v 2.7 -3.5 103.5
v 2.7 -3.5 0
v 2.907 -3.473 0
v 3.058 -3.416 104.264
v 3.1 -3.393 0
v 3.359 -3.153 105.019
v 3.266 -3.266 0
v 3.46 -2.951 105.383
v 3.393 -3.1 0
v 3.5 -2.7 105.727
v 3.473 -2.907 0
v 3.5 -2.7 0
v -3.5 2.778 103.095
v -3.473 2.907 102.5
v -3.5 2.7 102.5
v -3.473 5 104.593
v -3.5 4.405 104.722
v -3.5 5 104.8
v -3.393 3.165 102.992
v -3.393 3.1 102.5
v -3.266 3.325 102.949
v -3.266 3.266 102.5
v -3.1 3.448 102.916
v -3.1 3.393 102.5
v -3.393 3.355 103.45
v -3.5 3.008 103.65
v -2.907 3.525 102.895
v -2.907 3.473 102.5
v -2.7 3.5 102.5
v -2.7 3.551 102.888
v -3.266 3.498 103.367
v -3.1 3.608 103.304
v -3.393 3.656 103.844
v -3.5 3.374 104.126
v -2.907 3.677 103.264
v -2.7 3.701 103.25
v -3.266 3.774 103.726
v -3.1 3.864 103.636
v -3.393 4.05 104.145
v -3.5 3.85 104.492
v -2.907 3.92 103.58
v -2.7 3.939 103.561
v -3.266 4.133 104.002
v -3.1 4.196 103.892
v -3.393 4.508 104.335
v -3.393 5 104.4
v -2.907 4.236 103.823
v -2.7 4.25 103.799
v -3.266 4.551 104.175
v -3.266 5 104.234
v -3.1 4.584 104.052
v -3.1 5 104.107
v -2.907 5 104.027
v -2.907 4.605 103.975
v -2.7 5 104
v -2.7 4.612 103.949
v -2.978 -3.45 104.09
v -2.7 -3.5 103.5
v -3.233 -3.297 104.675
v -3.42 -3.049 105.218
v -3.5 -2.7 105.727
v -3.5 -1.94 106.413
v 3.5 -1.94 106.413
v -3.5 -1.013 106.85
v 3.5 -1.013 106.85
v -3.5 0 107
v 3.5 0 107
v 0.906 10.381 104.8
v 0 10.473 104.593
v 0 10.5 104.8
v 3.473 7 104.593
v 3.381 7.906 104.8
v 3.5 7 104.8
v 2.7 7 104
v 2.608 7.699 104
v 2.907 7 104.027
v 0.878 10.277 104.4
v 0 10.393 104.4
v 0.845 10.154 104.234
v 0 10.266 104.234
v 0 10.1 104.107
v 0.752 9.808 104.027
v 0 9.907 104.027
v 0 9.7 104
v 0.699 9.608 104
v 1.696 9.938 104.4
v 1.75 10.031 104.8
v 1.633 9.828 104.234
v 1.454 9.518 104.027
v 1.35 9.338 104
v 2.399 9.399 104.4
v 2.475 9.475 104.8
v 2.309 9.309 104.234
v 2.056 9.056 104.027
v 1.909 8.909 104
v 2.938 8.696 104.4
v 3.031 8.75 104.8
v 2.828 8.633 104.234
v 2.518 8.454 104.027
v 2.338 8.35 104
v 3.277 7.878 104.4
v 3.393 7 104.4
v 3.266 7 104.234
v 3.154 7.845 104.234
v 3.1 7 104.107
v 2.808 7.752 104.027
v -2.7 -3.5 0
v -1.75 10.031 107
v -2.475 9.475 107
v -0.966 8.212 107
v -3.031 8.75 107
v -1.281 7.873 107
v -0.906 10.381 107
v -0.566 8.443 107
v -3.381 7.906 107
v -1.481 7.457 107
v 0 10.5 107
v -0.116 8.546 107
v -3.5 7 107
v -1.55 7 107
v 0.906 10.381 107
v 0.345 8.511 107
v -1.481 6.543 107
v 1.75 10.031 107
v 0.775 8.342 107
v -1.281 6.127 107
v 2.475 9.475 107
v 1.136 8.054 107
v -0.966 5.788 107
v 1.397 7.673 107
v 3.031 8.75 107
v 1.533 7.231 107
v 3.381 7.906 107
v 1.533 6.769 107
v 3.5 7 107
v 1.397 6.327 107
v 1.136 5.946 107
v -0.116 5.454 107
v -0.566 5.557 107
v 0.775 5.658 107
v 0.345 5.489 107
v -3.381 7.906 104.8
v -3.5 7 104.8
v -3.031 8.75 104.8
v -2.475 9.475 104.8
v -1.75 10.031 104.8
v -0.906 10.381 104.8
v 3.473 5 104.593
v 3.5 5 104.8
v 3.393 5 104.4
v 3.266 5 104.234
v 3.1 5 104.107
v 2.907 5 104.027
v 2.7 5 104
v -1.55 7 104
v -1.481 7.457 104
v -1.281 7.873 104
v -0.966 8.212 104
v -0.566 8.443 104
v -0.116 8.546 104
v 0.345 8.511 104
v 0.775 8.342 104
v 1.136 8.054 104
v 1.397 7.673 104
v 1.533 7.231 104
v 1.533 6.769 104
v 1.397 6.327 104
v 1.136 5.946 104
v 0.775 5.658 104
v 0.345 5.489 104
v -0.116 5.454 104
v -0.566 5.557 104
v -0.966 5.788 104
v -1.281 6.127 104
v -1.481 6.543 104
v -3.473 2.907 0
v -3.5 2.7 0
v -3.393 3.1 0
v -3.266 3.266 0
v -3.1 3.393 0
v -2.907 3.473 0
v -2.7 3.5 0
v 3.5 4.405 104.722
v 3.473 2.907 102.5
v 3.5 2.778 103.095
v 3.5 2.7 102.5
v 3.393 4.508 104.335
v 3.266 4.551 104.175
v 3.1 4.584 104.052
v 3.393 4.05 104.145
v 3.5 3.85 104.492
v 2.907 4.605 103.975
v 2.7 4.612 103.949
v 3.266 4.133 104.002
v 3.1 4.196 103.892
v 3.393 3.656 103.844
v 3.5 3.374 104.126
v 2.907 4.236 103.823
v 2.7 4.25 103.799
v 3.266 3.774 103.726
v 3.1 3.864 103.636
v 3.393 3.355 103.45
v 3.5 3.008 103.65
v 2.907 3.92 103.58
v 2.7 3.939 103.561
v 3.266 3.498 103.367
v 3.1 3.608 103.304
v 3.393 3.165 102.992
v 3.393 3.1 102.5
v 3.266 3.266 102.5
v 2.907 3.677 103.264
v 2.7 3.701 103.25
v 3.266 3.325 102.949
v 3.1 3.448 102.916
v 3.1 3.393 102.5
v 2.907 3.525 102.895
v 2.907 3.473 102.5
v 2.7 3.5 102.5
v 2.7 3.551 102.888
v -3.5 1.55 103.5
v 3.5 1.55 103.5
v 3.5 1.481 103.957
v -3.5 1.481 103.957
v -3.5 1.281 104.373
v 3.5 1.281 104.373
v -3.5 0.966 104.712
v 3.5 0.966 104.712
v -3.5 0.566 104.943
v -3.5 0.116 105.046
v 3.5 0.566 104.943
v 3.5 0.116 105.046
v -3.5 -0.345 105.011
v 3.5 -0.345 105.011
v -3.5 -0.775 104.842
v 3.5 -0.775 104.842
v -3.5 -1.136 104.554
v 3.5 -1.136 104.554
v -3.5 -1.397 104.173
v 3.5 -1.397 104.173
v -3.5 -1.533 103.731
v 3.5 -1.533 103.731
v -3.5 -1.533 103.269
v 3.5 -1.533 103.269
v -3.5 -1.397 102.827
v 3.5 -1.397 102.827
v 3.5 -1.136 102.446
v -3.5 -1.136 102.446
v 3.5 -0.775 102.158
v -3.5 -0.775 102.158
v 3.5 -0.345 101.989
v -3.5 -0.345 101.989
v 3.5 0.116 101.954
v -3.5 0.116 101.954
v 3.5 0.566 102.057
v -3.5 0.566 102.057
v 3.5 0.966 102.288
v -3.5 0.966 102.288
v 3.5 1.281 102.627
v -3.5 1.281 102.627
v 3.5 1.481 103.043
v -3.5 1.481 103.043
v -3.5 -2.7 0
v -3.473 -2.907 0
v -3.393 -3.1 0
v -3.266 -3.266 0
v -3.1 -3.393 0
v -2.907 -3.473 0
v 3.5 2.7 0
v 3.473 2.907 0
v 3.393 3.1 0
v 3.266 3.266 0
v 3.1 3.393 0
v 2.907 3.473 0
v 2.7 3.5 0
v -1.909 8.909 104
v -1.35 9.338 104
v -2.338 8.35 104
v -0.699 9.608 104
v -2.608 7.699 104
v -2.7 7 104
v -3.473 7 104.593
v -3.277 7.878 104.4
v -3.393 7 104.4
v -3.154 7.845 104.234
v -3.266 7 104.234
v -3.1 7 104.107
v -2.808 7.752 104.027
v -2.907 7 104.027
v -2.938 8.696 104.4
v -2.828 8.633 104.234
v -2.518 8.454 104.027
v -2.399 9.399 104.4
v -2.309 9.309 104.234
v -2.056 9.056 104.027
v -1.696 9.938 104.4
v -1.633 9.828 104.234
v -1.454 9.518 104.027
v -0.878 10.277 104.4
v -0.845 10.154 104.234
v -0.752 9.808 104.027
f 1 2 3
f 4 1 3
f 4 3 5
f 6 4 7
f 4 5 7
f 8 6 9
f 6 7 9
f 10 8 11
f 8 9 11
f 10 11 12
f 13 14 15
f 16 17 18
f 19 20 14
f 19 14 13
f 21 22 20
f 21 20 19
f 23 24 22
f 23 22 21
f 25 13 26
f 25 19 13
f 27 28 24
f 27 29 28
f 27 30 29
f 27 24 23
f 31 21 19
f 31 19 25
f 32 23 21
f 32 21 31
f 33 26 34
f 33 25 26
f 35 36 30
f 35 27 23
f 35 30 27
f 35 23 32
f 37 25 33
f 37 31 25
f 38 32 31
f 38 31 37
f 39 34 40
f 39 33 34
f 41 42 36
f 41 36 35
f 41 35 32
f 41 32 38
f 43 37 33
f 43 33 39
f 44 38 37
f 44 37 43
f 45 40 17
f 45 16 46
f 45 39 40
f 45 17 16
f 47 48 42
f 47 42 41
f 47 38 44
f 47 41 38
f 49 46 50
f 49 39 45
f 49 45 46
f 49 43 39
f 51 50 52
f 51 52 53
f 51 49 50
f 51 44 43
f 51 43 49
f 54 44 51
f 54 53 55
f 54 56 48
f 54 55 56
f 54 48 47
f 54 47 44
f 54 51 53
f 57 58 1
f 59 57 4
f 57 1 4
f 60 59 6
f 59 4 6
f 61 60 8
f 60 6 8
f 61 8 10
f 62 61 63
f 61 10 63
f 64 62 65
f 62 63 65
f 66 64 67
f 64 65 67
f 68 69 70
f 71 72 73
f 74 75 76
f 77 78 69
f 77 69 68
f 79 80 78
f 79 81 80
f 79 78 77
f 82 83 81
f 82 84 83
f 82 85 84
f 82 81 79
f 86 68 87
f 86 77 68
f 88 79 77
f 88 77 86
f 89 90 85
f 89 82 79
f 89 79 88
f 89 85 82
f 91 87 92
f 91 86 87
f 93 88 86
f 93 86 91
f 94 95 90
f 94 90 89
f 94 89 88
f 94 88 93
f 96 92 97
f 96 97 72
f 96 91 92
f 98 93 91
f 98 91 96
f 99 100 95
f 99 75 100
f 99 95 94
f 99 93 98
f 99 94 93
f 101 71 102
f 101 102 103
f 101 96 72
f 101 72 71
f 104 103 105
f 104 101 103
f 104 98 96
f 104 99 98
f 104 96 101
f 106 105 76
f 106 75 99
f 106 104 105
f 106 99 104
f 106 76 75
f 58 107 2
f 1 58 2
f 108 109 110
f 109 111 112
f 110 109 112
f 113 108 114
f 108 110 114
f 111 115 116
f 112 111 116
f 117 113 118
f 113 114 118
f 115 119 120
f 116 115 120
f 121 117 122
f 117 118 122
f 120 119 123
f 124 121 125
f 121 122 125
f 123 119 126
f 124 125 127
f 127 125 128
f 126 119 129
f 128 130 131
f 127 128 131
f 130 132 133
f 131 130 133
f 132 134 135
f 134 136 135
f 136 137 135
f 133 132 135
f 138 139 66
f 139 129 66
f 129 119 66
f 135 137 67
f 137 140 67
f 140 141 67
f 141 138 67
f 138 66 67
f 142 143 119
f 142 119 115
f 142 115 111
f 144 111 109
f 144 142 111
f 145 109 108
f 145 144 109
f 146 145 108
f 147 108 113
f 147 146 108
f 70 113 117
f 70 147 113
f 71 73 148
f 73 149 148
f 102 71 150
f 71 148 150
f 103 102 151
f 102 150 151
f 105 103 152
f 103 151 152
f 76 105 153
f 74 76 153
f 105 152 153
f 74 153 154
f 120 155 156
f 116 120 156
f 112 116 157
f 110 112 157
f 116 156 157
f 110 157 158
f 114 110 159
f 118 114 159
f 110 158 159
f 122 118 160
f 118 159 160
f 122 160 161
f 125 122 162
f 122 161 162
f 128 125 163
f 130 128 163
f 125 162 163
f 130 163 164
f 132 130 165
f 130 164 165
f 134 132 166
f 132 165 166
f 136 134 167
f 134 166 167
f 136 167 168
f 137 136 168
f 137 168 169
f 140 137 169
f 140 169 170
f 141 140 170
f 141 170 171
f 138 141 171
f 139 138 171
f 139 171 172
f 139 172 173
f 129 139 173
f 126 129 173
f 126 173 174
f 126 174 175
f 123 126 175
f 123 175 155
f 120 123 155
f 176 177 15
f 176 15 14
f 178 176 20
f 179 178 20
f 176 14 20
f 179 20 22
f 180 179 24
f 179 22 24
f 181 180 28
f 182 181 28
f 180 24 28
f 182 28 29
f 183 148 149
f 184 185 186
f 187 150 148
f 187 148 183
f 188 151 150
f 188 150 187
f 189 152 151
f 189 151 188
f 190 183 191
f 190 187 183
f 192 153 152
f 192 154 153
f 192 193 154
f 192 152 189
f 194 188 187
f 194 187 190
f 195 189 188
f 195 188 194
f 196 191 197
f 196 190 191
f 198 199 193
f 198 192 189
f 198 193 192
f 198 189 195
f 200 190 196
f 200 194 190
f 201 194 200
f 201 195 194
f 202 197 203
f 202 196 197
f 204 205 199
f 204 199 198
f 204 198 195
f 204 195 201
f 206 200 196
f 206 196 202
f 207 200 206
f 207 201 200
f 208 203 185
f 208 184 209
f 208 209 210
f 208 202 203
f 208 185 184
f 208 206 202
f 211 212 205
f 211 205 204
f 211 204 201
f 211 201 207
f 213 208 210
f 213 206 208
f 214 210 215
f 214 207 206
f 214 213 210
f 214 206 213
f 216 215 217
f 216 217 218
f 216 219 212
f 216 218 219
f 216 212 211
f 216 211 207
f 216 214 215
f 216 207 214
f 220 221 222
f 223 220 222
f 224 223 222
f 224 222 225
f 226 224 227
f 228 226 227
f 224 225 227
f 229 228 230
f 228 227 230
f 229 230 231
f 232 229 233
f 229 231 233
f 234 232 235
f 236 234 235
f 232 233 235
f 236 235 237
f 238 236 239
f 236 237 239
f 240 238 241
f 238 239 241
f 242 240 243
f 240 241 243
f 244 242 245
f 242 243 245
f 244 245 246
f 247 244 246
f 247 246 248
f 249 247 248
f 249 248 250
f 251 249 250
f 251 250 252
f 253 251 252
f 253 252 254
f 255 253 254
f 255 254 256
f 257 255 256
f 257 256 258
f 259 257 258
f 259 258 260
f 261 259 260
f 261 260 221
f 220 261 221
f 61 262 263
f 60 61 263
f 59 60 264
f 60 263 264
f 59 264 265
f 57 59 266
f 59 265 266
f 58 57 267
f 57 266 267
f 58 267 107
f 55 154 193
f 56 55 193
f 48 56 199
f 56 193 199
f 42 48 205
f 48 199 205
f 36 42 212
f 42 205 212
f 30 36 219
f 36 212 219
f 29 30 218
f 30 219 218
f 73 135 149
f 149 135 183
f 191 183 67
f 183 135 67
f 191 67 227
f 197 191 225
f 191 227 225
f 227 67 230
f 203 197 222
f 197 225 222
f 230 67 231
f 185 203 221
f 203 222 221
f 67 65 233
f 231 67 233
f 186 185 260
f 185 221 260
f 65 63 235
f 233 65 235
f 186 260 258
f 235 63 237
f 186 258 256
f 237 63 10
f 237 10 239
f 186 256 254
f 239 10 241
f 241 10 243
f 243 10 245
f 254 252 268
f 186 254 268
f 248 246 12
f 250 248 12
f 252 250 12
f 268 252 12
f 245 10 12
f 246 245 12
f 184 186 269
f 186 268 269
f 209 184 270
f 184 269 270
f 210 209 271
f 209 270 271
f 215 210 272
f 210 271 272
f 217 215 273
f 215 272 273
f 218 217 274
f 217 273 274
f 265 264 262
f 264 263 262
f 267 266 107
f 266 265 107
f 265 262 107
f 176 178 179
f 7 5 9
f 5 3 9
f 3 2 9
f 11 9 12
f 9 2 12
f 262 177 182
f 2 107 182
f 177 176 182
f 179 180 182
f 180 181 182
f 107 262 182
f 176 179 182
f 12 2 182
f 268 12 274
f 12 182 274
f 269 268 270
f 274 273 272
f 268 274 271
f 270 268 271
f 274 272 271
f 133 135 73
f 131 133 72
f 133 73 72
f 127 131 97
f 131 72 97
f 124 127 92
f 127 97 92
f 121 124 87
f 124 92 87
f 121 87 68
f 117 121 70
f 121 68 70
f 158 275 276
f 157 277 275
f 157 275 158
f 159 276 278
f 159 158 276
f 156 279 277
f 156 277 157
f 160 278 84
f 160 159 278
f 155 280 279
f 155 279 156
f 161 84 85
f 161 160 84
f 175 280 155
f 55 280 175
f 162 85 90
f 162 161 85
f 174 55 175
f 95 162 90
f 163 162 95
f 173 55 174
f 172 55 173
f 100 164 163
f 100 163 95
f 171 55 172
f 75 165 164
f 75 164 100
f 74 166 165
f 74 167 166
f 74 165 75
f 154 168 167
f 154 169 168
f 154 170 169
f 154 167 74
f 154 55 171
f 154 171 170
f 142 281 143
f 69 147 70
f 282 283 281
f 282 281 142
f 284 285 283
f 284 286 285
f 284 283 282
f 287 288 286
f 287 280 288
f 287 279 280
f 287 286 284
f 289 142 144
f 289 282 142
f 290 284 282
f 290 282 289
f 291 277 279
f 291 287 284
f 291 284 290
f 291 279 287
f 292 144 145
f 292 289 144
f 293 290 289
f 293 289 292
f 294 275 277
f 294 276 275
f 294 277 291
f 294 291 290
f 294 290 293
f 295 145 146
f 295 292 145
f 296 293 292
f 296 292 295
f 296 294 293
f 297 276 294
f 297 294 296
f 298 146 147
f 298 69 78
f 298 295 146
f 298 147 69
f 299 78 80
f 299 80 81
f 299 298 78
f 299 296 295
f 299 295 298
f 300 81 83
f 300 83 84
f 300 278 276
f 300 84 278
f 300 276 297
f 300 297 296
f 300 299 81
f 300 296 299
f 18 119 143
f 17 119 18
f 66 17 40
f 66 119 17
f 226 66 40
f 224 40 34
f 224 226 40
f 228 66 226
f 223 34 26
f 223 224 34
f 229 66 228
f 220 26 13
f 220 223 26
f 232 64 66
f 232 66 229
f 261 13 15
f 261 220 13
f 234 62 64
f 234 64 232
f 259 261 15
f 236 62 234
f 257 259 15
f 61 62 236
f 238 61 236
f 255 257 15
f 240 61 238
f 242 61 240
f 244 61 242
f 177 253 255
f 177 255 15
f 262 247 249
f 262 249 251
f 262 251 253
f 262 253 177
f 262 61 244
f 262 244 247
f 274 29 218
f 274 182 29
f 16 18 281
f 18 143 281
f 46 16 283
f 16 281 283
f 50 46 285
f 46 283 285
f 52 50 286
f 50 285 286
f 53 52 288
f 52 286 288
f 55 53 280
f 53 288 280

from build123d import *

# Parameters (mm, degrees)
SKETCH_1_W          = 7
SKETCH_1_H          = 7
EXTRUDE_1_DEPTH     = 107
FILLET_1_R          = 3.5
SKETCH_5_R          = 1.55
CUT_EXTRUDE_2_DEPTH = 108.285833175
SKETCH_6_W          = 7
SKETCH_6_H          = 3
EXTRUDE_2_DEPTH     = 7
FILLET_2_R          = 3.5
SKETCH_7_R          = 1.55
CUT_EXTRUDE_4_DEPTH = 105.587284122
FILLET_3_R          = 1.5
FILLET_4_R          = 0.8
FILLET_5_R          = 0.8


# Some blends are built 0.0001 mm under size
with BuildPart() as part:
    # 草图1 → 凸台-拉伸1 (new body)
    with BuildSketch(Plane.XY):
        Rectangle(SKETCH_1_W, SKETCH_1_H)
    extrude(amount=EXTRUDE_1_DEPTH)

    # 圆角1
    fillet_1_edges = [part.edges().sort_by_distance(p)[0] for p in [
        (0, -3.5, 107),
    ]]
    fillet(fillet_1_edges, radius=FILLET_1_R)

    # 草图5 → 切除-拉伸2 (cut, through all)
    with BuildSketch(Plane(origin=(3.5, 0, 0), x_dir=(0, 0, -1), z_dir=(1, 0, 0))):
        with Locations(Location((-103.5, 0, 0), (0, 0, 90))):
            Circle(SKETCH_5_R)
    extrude(amount=-CUT_EXTRUDE_2_DEPTH, mode=Mode.SUBTRACT)

    # 草图6 → 凸台-拉伸2 (add)
    with BuildSketch(Plane(origin=(0, 3.5, 0), x_dir=(1, 0, 0), z_dir=(0, 1, 0))):
        with Locations((0, -105.5)):
            Rectangle(SKETCH_6_W, SKETCH_6_H)
    extrude(amount=EXTRUDE_2_DEPTH)

    # 圆角2
    fillet_2_edges = [part.edges().sort_by_distance(p)[0] for p in [
        (3.5, 10.5, 105.5),
        (-3.5, 10.5, 105.5),
    ]]
    fillet(fillet_2_edges, radius=FILLET_2_R - 0.0001)  # a hair under: the kernel refuses the full size

    # 草图7 → 切除-拉伸4 (cut, through all)
    with BuildSketch(Plane(origin=(0, 0, 104), x_dir=(-1, 0, 0), z_dir=(0, 0, -1))):
        with Locations((0, 7)):
            Circle(SKETCH_7_R)
    extrude(amount=-CUT_EXTRUDE_4_DEPTH, mode=Mode.SUBTRACT)

    # 圆角3
    fillet_3_edges = [part.edges().sort_by_distance(p)[0] for p in [
        (0, 3.5, 104),
    ]]
    fillet(fillet_3_edges, radius=FILLET_3_R)

    # 圆角4
    fillet_4_edges = [part.edges().sort_by_distance(p)[0] for p in [
        (-3.5, 6.00005, 104),
        (3.5, 6.00005, 104),
        (-2.474903023, 9.474903023, 104),
        (2.474903023, 9.474903023, 104),
        (3.5, 3.5, 51.25),
        (-3.5, 3.5, 51.25),
        (-3.5, 3.939339828, 103.560660172),
        (3.5, 3.939339828, 103.560660172),
    ]]
    fillet(fillet_4_edges, radius=FILLET_4_R)

    # 圆角5
    # the kernel refuses this fillet: 0.8 mm, written as the material it takes off along each edge
    with BuildSketch(Plane(origin=(3.5, -3.5, -4.8), x_dir=(0, 1, 0), z_dir=(0, 0, 1)), Plane(origin=(-3.5, -3.5, -4.8), x_dir=(1, 0, 0), z_dir=(0, 0, 1))) as fillet_5_piece_1:
        with BuildLine():
            CenterArc((FILLET_5_R, FILLET_5_R), FILLET_5_R, 180, 90)
            Line((0, FILLET_5_R), (-FILLET_5_R * 0.02, FILLET_5_R))
            Line((-FILLET_5_R * 0.02, FILLET_5_R), (-FILLET_5_R * 0.02, -FILLET_5_R * 0.02))
            Line((-FILLET_5_R * 0.02, -FILLET_5_R * 0.02), (FILLET_5_R, -FILLET_5_R * 0.02))
            Line((FILLET_5_R, -FILLET_5_R * 0.02), (FILLET_5_R, 0))
        make_face()
    extrude(amount=113.1, mode=Mode.SUBTRACT)


solid = part.part
